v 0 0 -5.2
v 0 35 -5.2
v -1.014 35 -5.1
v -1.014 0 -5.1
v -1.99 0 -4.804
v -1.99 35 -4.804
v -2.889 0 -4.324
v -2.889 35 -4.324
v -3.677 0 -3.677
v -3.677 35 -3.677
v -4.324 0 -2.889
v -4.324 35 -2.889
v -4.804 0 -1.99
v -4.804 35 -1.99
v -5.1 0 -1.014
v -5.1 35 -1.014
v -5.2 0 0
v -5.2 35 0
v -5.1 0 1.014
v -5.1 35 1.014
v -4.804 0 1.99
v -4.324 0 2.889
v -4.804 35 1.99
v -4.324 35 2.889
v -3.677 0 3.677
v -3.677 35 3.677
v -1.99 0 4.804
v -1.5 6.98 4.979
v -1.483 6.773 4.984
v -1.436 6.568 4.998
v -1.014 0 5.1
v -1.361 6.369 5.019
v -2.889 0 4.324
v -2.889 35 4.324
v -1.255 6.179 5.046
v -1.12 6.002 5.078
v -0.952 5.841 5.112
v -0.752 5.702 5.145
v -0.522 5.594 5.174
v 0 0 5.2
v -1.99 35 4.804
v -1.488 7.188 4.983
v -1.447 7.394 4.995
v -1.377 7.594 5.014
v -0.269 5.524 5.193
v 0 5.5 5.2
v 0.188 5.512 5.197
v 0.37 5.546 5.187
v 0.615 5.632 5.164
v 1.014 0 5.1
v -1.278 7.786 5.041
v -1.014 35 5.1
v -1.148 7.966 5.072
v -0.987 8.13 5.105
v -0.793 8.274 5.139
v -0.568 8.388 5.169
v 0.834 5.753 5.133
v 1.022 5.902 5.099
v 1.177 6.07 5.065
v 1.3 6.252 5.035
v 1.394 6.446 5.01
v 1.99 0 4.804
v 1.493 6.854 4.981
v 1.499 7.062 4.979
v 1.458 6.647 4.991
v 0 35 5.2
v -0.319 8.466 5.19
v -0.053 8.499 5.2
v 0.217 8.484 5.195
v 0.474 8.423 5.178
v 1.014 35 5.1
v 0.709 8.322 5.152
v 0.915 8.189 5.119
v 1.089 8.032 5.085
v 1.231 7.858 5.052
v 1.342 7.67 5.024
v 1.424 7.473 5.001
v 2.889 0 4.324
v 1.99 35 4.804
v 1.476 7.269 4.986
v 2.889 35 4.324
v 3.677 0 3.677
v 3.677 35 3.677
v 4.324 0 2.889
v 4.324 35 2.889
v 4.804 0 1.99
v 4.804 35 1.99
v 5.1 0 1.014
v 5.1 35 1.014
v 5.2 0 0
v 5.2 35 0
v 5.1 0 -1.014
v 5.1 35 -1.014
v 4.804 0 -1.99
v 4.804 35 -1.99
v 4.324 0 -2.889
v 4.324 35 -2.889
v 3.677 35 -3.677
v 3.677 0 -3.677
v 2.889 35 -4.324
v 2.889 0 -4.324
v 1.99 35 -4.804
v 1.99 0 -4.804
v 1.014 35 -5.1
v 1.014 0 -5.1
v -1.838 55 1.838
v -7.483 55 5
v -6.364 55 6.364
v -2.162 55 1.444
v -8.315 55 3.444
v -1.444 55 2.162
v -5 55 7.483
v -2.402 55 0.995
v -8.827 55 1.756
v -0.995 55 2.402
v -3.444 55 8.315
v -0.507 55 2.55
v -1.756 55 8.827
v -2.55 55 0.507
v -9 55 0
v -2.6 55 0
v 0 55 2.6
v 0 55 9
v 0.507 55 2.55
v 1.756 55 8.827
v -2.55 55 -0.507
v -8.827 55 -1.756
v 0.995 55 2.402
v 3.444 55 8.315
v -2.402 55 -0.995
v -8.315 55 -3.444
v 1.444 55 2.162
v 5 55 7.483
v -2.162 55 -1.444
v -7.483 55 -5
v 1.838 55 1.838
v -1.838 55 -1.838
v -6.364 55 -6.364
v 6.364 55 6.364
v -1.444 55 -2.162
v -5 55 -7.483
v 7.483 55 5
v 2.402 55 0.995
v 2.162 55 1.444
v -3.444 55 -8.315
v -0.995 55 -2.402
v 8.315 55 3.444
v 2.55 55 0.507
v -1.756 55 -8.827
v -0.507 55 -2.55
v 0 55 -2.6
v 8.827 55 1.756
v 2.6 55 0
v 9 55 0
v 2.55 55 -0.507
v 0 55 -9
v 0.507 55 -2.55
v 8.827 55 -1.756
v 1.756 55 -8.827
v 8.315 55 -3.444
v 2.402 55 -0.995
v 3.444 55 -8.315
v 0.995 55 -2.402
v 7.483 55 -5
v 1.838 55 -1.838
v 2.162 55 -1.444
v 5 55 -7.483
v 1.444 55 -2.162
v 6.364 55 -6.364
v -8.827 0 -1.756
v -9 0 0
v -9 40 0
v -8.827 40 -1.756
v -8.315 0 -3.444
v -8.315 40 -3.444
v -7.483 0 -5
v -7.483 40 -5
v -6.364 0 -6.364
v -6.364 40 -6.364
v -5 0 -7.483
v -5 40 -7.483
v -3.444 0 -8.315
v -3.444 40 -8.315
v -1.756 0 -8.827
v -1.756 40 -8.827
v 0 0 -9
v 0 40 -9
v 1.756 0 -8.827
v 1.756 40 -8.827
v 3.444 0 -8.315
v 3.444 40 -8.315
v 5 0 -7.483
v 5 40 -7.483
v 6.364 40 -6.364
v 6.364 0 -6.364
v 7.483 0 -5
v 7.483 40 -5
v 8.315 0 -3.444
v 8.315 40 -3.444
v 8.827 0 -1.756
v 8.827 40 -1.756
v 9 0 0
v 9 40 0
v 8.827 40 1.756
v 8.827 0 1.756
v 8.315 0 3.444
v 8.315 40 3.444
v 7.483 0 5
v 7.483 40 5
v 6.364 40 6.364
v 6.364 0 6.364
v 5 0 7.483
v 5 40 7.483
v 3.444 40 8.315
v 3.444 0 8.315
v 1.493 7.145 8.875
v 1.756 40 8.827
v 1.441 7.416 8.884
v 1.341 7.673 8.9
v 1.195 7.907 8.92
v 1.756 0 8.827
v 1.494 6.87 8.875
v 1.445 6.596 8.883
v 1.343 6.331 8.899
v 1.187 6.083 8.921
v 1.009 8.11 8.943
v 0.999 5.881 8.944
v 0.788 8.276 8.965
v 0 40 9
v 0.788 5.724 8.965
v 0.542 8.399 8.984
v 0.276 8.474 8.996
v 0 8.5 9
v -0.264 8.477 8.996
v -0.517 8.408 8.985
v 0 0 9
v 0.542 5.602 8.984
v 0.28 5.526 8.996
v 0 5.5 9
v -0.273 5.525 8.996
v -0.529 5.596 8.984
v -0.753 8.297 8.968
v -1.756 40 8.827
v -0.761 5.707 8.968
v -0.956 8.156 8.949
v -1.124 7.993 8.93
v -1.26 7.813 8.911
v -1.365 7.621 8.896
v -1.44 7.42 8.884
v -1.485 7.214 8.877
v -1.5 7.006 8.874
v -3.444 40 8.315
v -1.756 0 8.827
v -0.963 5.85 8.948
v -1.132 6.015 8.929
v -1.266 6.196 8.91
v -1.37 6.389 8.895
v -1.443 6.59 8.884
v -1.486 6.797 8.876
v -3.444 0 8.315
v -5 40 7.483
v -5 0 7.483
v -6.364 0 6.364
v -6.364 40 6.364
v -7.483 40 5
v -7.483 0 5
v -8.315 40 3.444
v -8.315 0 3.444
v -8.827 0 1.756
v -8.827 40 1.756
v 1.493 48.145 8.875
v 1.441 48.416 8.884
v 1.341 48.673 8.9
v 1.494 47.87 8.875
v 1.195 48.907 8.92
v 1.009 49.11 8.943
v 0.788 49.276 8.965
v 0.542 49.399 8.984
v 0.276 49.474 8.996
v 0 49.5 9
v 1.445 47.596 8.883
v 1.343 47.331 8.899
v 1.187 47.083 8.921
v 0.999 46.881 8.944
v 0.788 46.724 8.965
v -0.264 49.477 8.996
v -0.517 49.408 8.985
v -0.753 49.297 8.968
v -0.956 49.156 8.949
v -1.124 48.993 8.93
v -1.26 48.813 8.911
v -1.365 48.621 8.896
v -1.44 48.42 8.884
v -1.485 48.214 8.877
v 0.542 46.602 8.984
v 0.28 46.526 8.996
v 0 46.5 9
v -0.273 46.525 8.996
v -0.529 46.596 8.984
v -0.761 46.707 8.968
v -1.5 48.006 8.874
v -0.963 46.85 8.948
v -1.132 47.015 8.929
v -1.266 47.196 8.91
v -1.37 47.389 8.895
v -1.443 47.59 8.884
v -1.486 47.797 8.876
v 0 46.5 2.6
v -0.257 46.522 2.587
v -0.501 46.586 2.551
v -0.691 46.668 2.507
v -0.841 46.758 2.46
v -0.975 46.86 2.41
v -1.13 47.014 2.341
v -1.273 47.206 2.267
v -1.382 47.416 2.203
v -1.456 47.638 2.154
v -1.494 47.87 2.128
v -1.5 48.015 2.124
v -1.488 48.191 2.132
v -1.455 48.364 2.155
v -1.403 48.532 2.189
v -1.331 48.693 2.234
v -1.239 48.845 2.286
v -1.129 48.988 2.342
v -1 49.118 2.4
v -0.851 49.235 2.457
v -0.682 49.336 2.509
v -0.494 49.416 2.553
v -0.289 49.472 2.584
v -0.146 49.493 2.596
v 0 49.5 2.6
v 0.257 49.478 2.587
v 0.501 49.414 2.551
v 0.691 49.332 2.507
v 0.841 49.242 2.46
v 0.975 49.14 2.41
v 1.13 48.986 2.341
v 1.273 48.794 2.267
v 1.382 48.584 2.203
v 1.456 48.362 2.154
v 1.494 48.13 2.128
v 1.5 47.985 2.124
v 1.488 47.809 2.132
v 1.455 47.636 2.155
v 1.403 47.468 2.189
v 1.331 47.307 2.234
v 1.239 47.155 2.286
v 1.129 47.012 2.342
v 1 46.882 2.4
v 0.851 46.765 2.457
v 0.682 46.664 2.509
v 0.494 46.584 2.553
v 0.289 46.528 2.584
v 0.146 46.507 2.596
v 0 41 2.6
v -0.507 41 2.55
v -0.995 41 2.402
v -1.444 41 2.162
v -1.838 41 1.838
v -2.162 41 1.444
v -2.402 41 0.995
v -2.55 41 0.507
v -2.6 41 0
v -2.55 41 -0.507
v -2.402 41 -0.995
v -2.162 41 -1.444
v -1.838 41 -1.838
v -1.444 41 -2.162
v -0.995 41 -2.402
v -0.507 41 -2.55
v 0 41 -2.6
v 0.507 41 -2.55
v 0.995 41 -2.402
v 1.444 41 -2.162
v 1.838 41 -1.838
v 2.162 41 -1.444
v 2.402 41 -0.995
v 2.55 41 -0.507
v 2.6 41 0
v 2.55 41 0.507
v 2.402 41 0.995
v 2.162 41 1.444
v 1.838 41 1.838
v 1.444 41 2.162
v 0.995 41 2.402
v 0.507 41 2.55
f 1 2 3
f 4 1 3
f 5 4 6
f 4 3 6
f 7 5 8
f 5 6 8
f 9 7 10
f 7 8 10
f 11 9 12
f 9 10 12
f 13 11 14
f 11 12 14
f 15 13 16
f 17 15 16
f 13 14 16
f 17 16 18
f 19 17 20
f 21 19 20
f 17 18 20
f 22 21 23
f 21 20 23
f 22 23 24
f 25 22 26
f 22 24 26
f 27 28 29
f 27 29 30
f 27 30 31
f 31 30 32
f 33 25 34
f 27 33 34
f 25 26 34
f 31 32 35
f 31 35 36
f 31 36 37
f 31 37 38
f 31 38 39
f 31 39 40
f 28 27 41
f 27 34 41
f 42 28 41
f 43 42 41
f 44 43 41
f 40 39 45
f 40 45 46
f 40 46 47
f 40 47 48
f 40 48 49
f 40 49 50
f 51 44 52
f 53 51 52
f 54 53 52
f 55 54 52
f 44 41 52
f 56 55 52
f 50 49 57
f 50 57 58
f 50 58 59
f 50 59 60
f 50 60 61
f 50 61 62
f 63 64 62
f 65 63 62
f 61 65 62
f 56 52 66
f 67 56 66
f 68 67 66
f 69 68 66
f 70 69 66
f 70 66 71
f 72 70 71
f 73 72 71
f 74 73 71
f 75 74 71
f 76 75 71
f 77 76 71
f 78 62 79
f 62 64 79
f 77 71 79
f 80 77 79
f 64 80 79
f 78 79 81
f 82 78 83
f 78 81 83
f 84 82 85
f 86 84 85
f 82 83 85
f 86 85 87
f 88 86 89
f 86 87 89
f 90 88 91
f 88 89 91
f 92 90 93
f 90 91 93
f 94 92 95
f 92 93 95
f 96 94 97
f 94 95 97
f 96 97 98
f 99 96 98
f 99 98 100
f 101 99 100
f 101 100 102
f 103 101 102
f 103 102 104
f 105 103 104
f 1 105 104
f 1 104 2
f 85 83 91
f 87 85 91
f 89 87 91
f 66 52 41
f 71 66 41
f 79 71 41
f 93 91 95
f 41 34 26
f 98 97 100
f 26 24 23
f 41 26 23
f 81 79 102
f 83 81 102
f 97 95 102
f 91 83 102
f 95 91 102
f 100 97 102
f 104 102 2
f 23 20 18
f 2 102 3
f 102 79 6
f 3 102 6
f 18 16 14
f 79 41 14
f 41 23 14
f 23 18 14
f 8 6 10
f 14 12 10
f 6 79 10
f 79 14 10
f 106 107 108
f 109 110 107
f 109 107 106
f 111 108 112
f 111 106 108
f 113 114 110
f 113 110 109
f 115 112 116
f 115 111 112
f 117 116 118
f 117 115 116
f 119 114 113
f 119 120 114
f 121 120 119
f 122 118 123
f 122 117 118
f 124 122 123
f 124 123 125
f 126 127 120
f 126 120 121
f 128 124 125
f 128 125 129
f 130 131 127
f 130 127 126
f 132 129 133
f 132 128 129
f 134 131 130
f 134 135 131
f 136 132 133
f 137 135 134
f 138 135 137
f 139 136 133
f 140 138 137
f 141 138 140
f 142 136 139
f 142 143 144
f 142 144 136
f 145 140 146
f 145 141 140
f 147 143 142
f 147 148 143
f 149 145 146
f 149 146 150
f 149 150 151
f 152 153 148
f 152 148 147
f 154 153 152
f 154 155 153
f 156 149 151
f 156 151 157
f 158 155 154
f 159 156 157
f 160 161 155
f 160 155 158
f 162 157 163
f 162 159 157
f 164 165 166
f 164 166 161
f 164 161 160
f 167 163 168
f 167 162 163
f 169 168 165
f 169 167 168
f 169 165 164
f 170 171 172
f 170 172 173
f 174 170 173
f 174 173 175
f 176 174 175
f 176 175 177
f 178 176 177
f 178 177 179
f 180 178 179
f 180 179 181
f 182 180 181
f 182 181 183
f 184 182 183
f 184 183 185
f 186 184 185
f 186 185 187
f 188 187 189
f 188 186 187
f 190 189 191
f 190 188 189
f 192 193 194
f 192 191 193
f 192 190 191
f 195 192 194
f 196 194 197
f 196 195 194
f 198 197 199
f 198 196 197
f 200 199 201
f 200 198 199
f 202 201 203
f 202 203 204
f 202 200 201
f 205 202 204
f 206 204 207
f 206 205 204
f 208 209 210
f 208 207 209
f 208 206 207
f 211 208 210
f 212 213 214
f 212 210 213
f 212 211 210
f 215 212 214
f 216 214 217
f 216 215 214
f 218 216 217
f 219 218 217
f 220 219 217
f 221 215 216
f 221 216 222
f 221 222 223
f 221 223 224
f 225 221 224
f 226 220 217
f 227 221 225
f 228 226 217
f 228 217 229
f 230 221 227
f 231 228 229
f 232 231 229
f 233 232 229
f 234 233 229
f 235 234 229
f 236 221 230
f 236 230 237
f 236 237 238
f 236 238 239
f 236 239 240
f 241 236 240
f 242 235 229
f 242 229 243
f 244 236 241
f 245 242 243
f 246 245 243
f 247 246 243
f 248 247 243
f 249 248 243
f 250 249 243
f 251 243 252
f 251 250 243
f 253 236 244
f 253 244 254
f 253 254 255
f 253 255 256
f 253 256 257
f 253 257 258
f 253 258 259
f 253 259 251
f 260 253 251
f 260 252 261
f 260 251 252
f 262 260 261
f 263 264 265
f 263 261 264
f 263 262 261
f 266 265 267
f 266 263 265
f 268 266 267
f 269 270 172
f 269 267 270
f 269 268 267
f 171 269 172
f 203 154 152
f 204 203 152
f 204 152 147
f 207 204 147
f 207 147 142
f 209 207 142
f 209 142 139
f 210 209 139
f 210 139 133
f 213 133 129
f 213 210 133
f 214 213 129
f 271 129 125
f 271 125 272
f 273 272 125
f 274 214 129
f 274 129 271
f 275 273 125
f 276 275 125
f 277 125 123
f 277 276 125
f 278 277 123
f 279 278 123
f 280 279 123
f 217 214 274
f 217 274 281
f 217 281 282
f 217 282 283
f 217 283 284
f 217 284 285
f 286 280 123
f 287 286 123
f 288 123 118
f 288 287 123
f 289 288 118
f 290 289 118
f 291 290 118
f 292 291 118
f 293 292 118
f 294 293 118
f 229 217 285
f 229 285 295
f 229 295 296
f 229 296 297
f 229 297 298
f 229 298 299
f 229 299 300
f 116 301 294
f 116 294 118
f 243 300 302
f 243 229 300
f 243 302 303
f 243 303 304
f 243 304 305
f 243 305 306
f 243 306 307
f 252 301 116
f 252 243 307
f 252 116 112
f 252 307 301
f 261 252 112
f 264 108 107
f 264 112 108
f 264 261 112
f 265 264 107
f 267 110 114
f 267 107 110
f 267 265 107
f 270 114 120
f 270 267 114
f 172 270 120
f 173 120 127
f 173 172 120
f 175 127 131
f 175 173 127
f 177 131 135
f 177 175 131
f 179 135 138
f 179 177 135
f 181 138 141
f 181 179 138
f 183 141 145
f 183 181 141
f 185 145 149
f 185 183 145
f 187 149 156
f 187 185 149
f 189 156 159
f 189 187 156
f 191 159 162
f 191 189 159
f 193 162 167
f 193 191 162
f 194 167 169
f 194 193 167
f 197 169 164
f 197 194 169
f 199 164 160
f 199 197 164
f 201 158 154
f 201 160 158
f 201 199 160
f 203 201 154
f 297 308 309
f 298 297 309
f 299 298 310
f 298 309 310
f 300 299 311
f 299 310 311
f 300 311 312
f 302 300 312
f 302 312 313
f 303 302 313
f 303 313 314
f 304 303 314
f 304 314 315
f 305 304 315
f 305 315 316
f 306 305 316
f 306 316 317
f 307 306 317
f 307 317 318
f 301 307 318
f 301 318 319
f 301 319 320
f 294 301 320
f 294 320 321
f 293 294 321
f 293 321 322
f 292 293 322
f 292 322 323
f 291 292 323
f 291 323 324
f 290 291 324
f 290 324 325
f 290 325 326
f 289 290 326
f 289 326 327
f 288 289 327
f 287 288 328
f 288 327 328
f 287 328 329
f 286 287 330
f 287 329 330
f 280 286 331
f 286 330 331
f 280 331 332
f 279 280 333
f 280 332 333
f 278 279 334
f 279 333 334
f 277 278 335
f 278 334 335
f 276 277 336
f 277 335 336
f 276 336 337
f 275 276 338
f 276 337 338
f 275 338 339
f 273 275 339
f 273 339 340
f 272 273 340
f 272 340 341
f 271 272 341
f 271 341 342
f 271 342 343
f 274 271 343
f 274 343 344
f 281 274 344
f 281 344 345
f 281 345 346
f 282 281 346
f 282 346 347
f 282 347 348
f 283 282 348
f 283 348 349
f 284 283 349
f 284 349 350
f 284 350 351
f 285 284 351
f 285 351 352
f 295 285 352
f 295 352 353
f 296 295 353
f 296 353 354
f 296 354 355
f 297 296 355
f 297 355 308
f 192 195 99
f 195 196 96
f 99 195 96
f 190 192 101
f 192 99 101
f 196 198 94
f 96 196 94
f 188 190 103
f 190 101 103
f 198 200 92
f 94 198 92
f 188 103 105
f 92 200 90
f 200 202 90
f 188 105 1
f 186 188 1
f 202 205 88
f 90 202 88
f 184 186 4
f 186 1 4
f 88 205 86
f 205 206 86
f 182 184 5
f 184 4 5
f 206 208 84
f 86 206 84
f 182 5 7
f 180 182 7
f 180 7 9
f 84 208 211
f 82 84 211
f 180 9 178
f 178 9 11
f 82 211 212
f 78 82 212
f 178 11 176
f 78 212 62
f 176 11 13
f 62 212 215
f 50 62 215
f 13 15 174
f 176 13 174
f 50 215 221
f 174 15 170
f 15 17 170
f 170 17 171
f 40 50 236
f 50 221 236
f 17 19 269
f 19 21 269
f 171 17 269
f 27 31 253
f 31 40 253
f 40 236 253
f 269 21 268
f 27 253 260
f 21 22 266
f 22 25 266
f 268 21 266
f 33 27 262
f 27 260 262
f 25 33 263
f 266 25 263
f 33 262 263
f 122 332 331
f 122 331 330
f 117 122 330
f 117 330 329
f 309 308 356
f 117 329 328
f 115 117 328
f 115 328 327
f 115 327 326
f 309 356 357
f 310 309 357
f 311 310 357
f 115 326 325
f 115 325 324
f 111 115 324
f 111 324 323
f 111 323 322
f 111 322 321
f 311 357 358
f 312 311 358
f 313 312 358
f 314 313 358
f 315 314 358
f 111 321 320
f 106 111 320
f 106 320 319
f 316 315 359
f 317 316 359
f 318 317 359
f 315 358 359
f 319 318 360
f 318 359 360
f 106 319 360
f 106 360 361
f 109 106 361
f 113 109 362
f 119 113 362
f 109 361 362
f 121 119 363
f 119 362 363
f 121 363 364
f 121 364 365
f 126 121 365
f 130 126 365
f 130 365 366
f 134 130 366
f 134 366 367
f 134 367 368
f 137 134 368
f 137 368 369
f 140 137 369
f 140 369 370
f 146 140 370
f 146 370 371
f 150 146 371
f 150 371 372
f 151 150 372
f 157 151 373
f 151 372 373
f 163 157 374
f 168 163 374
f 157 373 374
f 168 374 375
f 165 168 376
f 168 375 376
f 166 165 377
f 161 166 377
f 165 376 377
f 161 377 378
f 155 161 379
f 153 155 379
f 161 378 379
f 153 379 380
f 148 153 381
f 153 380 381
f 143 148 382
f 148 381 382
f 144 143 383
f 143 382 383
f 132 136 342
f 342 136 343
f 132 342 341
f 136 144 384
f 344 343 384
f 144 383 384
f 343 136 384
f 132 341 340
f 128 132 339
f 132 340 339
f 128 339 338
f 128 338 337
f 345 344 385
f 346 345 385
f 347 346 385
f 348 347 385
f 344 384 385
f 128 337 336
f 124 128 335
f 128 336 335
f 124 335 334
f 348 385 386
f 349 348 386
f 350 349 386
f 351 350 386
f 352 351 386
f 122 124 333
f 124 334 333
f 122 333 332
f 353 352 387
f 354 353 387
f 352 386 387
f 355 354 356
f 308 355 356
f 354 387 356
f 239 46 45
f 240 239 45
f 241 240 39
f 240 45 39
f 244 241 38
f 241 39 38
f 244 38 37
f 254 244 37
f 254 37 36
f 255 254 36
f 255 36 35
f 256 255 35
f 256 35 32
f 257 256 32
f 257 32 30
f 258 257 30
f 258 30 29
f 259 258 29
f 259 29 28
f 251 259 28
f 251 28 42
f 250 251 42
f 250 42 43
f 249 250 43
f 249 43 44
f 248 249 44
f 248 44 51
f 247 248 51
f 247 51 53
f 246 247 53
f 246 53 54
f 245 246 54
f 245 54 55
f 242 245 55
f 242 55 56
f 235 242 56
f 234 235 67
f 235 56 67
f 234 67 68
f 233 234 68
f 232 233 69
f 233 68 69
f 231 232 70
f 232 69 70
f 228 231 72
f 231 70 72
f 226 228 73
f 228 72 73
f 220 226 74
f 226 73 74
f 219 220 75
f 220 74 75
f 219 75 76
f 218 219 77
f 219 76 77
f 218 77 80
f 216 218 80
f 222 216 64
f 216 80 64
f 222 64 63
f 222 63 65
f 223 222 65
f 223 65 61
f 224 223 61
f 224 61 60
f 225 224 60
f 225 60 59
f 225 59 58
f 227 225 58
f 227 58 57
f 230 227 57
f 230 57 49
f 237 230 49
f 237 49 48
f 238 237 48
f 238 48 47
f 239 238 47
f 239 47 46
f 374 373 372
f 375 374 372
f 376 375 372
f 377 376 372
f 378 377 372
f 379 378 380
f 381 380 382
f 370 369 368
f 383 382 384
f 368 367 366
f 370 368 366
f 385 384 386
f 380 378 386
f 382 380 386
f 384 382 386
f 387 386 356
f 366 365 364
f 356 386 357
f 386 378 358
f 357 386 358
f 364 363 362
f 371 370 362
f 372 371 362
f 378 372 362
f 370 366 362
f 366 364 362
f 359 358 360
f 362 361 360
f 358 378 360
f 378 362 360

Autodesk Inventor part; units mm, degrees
ref_plane "YZ Plane" through (0, 0, 0) normal (1, 0, 0) x (0, 1, 0)
ref_plane "XZ Plane" through (0, 0, 0) normal (0, 1, 0) x (-1, 0, 0)
sketch "スケッチ1" plane through (0, 0, 0) normal (0, 1, 0) x (-1, 0, 0)
  circle A0 centre (0, 0) radius 9
  dimension "d0" = 18
extrude "押し出し1" add sketch "スケッチ1" along normal blind 40
sketch "スケッチ2" plane through (0, 0, 0) normal (0, -1, 0) x (1, 0, 0)
  circle A0 centre (0, 0) radius 5.2
  dimension "d4" = 10.4
hole "穴1" at (0, 0, 0) direction (0, 1, 0) diameter 10.4 depth 35
ref_plane "作業平面1" through (0, 0, 9) normal (0, 0, 1) x (1, 0, 0)
sketch "スケッチ3" plane through (0, 0, 9) normal (0, 0, 1) x (1, 0, 0)
  point P0 (0, 0)
  point P1 (0, 7)
hole "穴2" at (0, 7, 9) direction (0, 0, -1) diameter 3 depth 6
ref_plane "作業平面4" through (0, 40, 0) normal (0, 1, 0) x (1, 0, 0)
sketch "スケッチ5" plane through (0, 40, 0) normal (0, 1, 0) x (1, 0, 0)
  circle A0 centre (0, 0) radius 9
  dimension "d41" = 18
extrude "押し出し2" add sketch "スケッチ5" along normal blind 15
ref_plane "作業平面5" through (0, 55, 0) normal (0, 1, 0) x (1, 0, 0)
sketch "スケッチ6" plane through (0, 55, 0) normal (0, 1, 0) x (1, 0, 0)
  circle A0 centre (0, 0) radius 2.6
  dimension "d23" = 5.2
hole "穴3" at (0, 55, 0) direction (0, -1, 0) diameter 5.2 depth 14
sketch "スケッチ7" plane through (0, 0, 9) normal (0, 0, 1) x (1, 0, 0)
  circle A0 centre (0, 48) radius 1.5
  line L0 (9, 55) -> (-9, 55) projected
  point P0 (0, 0)
  dimension "d31" = 3
  dimension "d42" = 7
hole "穴4" at (0, 48, 9) direction (0, 0, -1) diameter 3 depth 8
ref_plane "作業平面7" through (0, 41, 0) normal (0, 1, 0) x (1, 0, 0)
ref_plane "作業平面8" through (0, 35, 0) normal (0, -1, 0) x (1, 0, 0)
equation "\"d5\" = d4"
properties part number "joint_3D プリント"
